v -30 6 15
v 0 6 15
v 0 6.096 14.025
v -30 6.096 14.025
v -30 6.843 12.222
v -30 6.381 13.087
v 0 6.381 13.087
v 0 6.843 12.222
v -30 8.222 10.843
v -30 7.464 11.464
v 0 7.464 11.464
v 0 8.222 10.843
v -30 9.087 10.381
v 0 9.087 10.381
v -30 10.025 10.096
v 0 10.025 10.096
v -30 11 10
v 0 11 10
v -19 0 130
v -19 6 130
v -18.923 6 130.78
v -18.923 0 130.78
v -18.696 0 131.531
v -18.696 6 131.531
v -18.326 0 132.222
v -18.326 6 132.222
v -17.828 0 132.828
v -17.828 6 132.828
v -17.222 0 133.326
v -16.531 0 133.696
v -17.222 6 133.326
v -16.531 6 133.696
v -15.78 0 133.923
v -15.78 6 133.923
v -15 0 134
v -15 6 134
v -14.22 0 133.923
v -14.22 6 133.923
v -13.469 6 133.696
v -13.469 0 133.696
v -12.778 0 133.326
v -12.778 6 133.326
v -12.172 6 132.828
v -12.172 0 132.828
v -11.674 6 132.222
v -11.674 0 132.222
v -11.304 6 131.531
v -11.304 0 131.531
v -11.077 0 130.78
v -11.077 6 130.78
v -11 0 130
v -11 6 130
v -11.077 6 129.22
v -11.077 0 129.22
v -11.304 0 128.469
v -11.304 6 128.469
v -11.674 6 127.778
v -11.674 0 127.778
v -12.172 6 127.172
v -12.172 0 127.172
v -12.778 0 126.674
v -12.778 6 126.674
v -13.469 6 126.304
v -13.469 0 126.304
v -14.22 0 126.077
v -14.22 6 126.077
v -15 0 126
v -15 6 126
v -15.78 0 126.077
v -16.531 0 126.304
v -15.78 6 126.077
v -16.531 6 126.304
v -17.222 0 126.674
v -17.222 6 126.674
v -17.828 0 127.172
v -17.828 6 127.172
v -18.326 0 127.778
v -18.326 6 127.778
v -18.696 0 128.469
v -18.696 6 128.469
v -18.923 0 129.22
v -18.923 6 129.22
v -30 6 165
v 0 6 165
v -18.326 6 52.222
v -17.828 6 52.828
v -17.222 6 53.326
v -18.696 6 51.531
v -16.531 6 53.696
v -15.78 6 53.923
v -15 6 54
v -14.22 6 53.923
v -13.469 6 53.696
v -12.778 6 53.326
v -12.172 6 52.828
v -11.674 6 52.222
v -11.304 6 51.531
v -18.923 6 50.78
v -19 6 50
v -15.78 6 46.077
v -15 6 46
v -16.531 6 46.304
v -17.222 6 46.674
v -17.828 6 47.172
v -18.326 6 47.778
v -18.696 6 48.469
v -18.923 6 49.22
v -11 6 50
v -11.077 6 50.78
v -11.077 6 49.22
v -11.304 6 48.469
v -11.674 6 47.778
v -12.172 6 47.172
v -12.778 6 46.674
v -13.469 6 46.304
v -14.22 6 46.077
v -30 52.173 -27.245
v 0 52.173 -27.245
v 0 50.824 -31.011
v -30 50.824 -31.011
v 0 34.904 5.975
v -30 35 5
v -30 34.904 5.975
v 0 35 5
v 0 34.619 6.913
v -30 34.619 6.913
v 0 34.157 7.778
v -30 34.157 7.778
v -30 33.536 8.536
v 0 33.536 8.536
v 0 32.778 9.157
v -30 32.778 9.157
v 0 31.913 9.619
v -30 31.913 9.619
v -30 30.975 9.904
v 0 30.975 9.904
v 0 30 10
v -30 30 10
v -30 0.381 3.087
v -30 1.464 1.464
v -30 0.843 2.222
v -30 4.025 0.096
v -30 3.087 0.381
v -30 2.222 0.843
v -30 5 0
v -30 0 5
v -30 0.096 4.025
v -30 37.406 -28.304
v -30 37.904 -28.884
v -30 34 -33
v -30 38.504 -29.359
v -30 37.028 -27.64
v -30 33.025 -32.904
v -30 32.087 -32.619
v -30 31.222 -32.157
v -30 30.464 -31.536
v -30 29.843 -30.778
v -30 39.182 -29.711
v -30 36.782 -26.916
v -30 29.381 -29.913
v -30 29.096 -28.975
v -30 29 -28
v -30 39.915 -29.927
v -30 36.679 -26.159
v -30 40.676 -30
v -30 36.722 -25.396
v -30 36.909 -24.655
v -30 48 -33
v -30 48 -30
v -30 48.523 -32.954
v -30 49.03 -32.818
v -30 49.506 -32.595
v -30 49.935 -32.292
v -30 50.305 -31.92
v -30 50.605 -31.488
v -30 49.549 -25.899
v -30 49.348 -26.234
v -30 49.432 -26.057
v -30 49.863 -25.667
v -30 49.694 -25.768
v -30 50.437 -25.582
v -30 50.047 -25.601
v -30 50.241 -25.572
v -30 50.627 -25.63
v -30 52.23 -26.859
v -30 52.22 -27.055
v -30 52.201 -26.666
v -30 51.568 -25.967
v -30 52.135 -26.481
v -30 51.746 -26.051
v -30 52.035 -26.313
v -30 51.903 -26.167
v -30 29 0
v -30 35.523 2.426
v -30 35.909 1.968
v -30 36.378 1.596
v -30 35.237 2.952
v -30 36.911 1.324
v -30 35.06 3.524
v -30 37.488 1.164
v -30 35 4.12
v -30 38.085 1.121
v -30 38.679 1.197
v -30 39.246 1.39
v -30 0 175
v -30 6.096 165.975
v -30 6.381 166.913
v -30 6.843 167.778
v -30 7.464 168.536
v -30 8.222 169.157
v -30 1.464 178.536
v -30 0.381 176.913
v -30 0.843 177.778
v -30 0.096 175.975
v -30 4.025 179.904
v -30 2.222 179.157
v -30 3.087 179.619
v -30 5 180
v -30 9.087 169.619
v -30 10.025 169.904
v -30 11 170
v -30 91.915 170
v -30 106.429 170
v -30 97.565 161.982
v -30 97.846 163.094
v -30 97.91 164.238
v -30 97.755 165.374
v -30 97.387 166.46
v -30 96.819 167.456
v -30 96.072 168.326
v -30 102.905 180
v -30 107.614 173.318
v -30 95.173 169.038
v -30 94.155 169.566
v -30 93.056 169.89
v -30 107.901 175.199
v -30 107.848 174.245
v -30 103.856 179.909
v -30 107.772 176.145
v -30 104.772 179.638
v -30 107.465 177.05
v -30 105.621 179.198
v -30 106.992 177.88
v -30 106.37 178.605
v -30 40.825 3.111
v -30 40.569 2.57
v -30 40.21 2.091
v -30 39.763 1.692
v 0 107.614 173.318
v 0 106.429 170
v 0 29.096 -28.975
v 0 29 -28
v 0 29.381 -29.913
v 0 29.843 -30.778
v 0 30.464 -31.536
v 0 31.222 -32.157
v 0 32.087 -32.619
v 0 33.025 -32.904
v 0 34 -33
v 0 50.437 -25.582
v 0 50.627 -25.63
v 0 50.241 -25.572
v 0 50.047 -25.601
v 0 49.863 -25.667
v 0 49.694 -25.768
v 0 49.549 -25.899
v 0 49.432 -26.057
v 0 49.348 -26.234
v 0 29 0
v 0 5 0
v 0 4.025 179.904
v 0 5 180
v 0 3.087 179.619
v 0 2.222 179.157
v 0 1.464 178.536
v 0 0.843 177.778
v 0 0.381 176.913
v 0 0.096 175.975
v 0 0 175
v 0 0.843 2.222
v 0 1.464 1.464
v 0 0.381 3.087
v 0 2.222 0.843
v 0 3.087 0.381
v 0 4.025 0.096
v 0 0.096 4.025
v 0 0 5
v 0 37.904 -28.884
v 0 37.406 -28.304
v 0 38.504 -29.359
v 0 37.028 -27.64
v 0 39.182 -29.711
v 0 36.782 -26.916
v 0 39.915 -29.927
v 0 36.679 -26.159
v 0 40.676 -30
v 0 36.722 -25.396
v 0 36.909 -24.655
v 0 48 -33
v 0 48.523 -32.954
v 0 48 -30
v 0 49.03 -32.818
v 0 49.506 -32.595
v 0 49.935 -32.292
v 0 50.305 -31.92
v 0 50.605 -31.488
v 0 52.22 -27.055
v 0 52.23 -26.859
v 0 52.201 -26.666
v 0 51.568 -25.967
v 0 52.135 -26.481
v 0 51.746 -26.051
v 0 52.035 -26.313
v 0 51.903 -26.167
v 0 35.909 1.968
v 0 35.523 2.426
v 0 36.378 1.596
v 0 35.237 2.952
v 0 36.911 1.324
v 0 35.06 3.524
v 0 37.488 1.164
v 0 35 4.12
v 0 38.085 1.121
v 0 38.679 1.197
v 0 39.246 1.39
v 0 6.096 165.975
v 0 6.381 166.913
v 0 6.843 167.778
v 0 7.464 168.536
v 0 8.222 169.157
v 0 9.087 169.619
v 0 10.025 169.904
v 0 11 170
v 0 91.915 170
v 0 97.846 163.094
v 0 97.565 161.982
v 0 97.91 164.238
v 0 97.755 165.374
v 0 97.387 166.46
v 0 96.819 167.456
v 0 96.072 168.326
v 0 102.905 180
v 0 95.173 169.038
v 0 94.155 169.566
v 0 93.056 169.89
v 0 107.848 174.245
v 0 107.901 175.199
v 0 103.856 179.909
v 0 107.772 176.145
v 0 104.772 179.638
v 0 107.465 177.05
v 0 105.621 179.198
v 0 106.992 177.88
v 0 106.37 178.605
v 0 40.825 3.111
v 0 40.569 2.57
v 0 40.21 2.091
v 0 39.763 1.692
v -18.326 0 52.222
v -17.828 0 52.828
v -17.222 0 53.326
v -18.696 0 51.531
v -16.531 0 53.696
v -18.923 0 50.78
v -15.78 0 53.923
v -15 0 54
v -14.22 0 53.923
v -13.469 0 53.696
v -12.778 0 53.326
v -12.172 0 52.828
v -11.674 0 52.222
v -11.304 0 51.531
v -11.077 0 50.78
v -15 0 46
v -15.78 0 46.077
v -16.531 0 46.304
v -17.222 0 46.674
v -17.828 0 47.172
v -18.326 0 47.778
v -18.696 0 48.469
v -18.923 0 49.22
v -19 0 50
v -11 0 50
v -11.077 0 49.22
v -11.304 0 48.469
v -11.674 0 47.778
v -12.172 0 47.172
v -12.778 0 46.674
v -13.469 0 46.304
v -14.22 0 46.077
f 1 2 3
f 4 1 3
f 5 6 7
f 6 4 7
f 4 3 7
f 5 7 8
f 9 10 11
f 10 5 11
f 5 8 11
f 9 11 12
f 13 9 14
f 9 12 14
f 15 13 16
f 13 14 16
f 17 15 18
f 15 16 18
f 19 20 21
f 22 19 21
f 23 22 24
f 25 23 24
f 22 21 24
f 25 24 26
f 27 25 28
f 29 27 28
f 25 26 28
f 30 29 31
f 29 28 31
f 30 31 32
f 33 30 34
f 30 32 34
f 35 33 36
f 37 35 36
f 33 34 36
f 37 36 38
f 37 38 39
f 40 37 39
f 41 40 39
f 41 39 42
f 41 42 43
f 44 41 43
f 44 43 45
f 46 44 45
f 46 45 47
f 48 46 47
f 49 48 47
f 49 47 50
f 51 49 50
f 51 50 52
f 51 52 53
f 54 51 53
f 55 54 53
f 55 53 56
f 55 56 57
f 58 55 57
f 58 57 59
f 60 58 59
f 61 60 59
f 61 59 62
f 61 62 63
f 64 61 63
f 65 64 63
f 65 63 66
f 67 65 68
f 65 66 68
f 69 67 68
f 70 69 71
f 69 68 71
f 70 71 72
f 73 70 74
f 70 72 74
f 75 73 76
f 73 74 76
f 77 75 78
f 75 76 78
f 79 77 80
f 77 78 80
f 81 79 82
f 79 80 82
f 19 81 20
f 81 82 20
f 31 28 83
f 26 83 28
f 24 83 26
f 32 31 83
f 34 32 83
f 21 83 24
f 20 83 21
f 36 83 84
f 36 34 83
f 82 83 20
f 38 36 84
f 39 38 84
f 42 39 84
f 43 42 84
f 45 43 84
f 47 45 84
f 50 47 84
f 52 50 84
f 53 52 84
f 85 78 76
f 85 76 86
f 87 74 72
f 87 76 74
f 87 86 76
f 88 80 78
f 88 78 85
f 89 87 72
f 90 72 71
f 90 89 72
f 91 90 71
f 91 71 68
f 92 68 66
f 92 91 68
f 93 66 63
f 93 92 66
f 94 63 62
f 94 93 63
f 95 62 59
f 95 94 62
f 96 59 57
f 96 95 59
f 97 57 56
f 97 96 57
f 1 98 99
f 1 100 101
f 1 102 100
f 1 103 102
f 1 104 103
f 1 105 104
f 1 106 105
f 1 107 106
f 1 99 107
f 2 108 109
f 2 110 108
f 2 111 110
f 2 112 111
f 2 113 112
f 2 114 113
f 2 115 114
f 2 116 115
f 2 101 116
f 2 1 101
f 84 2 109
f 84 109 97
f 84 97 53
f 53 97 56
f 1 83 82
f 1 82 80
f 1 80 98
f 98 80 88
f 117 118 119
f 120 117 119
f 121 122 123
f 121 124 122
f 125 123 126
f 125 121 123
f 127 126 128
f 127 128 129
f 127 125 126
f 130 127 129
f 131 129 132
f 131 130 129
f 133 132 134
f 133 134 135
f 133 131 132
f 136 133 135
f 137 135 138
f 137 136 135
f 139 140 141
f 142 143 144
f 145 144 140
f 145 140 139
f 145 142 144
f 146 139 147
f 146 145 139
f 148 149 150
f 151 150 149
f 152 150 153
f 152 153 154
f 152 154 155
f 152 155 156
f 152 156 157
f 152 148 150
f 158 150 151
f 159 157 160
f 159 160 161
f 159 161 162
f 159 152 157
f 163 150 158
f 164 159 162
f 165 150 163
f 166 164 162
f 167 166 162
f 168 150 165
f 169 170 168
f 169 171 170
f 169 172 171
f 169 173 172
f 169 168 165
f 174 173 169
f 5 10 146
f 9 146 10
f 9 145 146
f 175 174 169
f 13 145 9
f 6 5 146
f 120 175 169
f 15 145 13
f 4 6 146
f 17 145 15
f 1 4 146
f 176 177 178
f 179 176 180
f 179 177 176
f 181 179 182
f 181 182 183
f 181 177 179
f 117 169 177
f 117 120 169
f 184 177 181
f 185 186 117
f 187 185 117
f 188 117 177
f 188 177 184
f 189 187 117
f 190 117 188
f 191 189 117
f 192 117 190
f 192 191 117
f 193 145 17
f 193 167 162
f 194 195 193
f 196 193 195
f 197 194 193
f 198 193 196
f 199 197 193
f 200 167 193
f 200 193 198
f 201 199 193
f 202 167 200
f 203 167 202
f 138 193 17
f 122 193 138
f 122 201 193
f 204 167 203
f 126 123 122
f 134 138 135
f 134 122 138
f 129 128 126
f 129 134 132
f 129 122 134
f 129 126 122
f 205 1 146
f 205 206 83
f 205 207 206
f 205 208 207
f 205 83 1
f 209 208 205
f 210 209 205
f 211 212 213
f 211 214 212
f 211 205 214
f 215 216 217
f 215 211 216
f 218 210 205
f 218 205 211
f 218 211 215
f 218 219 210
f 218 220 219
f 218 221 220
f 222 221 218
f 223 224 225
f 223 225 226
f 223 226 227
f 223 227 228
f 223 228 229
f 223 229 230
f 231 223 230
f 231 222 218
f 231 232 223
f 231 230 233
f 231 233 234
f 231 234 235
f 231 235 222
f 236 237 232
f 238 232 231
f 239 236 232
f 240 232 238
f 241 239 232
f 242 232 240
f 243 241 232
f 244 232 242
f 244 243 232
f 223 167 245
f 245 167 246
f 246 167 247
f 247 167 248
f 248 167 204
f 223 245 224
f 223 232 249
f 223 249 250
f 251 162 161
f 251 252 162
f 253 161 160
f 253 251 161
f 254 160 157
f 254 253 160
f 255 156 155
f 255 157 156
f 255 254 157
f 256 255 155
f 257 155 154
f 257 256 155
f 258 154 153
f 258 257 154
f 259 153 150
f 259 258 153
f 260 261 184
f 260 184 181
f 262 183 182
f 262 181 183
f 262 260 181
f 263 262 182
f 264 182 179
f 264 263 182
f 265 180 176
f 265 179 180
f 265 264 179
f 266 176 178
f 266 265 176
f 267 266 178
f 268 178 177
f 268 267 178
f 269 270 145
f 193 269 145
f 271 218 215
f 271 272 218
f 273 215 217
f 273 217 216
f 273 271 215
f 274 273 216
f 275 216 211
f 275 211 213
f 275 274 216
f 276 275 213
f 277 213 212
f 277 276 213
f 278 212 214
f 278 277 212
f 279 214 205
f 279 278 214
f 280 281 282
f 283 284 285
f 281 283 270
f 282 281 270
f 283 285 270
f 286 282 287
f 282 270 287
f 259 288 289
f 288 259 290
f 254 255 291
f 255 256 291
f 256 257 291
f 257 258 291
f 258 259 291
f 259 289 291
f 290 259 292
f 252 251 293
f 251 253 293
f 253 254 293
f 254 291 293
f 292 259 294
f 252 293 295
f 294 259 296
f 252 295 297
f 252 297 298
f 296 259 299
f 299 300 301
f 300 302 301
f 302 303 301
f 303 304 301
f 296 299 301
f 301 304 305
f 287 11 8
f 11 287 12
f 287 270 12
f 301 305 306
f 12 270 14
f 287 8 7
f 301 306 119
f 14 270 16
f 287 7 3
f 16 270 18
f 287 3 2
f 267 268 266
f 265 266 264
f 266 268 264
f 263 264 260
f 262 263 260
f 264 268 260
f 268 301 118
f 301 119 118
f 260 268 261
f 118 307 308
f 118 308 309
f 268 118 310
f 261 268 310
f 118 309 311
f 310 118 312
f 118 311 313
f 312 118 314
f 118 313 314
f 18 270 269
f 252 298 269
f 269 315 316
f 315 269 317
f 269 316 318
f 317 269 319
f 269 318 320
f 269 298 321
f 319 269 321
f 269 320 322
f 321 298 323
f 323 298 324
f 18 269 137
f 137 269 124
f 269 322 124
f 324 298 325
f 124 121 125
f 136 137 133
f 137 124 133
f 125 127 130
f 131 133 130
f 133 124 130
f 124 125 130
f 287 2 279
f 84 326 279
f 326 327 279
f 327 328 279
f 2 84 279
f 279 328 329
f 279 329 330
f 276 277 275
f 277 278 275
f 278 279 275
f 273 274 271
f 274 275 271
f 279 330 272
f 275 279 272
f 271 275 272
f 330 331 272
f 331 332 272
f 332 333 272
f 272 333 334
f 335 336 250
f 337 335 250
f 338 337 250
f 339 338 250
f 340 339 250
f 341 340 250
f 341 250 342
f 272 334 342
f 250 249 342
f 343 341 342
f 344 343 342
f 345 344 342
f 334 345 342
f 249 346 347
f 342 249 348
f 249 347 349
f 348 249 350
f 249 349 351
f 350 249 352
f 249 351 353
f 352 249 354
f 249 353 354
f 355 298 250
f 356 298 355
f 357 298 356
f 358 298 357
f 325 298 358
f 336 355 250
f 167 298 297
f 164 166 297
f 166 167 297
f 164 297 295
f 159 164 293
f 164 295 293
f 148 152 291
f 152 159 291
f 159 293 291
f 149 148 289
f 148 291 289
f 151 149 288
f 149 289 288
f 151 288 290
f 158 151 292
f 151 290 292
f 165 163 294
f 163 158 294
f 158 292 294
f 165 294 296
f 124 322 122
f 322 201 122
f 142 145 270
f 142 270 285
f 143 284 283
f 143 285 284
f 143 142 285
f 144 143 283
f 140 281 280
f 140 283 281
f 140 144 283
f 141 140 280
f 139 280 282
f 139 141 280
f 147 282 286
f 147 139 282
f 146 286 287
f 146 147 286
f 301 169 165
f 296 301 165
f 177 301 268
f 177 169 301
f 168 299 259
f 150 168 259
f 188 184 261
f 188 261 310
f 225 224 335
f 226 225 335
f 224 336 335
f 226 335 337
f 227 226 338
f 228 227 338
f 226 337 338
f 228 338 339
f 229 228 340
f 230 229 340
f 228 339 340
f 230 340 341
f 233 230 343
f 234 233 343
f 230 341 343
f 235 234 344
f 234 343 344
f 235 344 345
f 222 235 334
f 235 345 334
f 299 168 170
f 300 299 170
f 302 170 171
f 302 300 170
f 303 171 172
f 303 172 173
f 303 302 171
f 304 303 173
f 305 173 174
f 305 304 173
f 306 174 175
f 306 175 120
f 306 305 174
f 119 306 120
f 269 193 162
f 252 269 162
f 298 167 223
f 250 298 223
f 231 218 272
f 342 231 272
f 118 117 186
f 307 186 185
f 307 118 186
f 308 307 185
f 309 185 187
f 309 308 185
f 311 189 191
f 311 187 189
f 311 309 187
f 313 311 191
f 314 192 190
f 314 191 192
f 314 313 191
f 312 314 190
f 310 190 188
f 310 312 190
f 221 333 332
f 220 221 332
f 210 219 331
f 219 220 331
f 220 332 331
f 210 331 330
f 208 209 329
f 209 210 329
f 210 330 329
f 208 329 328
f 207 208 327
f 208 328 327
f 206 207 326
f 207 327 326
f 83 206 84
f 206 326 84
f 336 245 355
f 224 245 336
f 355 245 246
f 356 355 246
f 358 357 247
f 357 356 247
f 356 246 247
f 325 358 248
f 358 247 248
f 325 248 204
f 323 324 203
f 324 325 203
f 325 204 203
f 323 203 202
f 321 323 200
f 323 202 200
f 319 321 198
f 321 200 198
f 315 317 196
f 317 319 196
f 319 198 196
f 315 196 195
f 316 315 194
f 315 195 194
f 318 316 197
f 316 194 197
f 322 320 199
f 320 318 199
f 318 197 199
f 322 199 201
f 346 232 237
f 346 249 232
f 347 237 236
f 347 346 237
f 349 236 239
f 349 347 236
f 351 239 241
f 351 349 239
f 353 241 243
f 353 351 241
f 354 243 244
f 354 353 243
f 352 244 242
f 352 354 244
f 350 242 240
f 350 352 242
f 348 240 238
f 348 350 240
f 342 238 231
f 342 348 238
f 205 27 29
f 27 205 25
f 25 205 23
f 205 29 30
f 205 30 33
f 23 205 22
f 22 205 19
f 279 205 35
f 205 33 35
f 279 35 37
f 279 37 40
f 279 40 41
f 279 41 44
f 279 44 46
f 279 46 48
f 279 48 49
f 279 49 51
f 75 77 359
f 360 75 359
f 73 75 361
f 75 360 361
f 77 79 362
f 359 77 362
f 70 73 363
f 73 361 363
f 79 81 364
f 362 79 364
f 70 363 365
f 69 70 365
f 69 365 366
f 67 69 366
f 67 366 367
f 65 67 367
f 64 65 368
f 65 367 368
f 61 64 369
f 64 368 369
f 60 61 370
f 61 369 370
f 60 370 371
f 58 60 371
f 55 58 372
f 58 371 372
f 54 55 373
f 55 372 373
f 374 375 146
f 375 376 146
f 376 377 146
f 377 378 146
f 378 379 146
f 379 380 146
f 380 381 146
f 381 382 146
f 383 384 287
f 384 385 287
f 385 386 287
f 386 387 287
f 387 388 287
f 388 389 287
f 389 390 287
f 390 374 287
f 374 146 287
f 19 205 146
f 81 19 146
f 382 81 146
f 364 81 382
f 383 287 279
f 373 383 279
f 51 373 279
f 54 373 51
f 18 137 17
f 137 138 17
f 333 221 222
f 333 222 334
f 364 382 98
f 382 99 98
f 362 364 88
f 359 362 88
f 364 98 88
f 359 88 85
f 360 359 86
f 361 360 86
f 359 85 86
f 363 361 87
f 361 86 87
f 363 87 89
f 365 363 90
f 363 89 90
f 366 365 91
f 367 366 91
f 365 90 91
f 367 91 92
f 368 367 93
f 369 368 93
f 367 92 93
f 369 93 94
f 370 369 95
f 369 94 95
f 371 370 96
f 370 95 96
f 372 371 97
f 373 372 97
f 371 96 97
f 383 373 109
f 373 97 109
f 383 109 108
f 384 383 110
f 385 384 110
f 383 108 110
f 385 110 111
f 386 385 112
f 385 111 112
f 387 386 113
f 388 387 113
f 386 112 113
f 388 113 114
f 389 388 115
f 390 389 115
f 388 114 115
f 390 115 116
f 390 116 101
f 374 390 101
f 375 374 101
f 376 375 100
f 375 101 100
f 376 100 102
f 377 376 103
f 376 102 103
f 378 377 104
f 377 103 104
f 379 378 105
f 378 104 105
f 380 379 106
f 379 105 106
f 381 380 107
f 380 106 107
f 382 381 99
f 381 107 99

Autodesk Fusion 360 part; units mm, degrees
sketch "Sketch5" plane through (0, 0, 0) normal (0, 1, 0) x (1, 0, 0)
  line L0 (0, 0) -> (-30, 0)
  line L1 (-30, 0) -> (-30, -180)
  line L2 (-30, -180) -> (0, -180)
  line L3 (0, -180) -> (0, 0)
  dimension "d12" = 30
  dimension "d13" = 180
extrude "Extrude4" add sketch "Sketch5" along normal blind 4
sketch "Sketch6" plane through (0, 4, 0) normal (0, 1, 0) x (-1, 0, 0)
  line L0 (0, 180) -> (0, 0)
  line L1 (0, 0) -> (30, 0)
  line L2 (30, 0) -> (30, 180)
  line L3 (30, 180) -> (0, 180)
  line L4 (0, 180) -> (30, 180)
  line L5 (30, 180) -> (30, 170)
  line L6 (30, 170) -> (0, 170)
  line L7 (0, 170) -> (0, 180)
  dimension "d16" = 10
extrude "Extrude5" add sketch "Sketch6" along normal blind 106 contours L0 L2 L3 L4 L5 L6 L7
sketch "Sketch7" plane through (0, 4, 0) normal (0, 1, 0) x (-1, 0, 0)
  line L0 (30, 170) -> (0, 170)
  line L1 (0, 170) -> (0, 0)
  line L2 (0, 0) -> (30, 0)
  line L3 (30, 0) -> (30, 170)
  line L4 (0, 0) -> (30, 0)
  line L5 (30, 0) -> (30, 10)
  line L6 (30, 10) -> (0, 10)
  line L7 (0, 10) -> (0, 0)
  dimension "d19" = 10
extrude "Extrude6" add sketch "Sketch7" along normal blind 25 contours L1 L2 L3 L4 L5 L6 L7
sketch "Sketch8" plane through (-30, 0, 0) normal (-1, 0, 0) x (0, 0, 1)
  line L0 (0, 0) -> (180, 0)
  line L1 (180, 0) -> (180, 110)
  line L2 (180, 110) -> (170, 110)
  line L3 (170, 110) -> (170, 4)
  line L4 (170, 4) -> (10, 4)
  line L5 (10, 4) -> (10, 29)
  line L6 (10, 29) -> (0, 29)
  line L7 (0, 29) -> (0, 0)
  line L8 (10, 29) -> (-30, 29)
  line L9 (-30, 29) -> (-30, 35)
  line L10 (-30, 35) -> (10, 35)
  line L11 (10, 35) -> (10, 29)
  dimension "d22" = 40
  dimension "d23" = 6
extrude "Extrude7" add sketch "Sketch8" against normal blind 30 contours L6 L8 L9 L10 L11
sketch "Sketch9" plane through (-30, 0, 0) normal (-1, 0, 0) x (0, 0, 1)
  line L0 (0, 0) -> (180, 0)
  line L1 (180, 0) -> (180, 110)
  line L2 (180, 110) -> (170, 110)
  line L3 (170, 110) -> (170, 4)
  line L4 (170, 4) -> (10, 4)
  line L5 (10, 4) -> (10, 35)
  line L6 (10, 35) -> (-30, 35)
  line L7 (-30, 35) -> (-30, 29)
  line L8 (-30, 29) -> (0, 29)
  line L9 (0, 29) -> (0, 0)
  line L10 (-30, 35) -> (180, 110)
  line L11 (-30, 29) -> (180, 104)
  line L12 (180, 104) -> (180, 110)
  line L13 (-30, 35) -> (-30, 29)
extrude "Extrude8" add sketch "Sketch9" against normal blind 30 contours L3 L6 L10 L11
sketch "Sketch10" plane through (-30, 0, 0) normal (-1, 0, 0) x (0, 0, 1)
  line L0 (170, 100.4286) -> (170, 4)
  line L1 (170, 4) -> (10, 4)
  line L2 (10, 4) -> (10, 35)
  line L3 (10, 35) -> (-13.2, 35)
  line L4 (-13.2, 35) -> (170, 100.4286)
  line L5 (170, 106.4286) -> (-30, 35)
  line L6 (-30, 35) -> (-30, 29)
  line L7 (-30, 29) -> (0, 29)
  line L8 (0, 29) -> (0, 0)
  line L9 (0, 0) -> (180, 0)
  line L10 (180, 0) -> (180, 110)
  line L11 (180, 110) -> (170, 110)
  line L12 (170, 110) -> (170, 106.4286)
  line L13 (180, 110) -> (170, 106.4286)
  line L14 (170, 110) -> (180, 110)
extrude "Extrude9" cut sketch "Sketch10" against normal blind 30 contours L11 L12 L13 L14
extrude "Extrude10" add 1 faces at (-20, 4, 63.3333) along direction (0, 1, 0) blind 2
sketch "Sketch11" plane through (-30, 0, 0) normal (-1, 0, 0) x (0, 0, 1)
  line L0 (180, 110) -> (-30, 35)
  line L1 (-30, 35) -> (-30, 29)
  line L2 (-30, 29) -> (0, 29)
  line L3 (0, 29) -> (0, 0)
  line L4 (0, 0) -> (180, 0)
  line L5 (180, 0) -> (180, 110)
  line L6 (170, 6) -> (10, 6)
  line L7 (10, 6) -> (10, 35)
  line L8 (10, 35) -> (-13.2, 35)
  line L9 (-13.2, 35) -> (170, 100.4286)
  line L10 (170, 100.4286) -> (170, 6)
  line L11 (-30, 29) -> (-33, 29)
  line L12 (-33, 29) -> (-33, 48)
  line L13 (-33, 48) -> (-30, 48)
  line L14 (-30, 48) -> (-30, 29)
  dimension "d32" = 3
  dimension "d33" = 19
extrude "Extrude11" add sketch "Sketch11" against normal blind 30 contours L1 L11 L12 L13 L14
sketch "Sketch12" plane through (-30, 0, 0) normal (-1, 0, 0) x (0, 0, 1)
  line L0 (180, 110) -> (-30, 35)
  line L1 (-30, 35) -> (-30, 48)
  line L2 (-30, 48) -> (-33, 48)
  line L3 (-33, 48) -> (-33, 29)
  line L4 (-33, 29) -> (0, 29)
  line L5 (0, 29) -> (0, 0)
  line L6 (0, 0) -> (180, 0)
  line L7 (180, 0) -> (180, 110)
  line L8 (170, 6) -> (10, 6)
  line L9 (10, 6) -> (10, 35)
  line L10 (10, 35) -> (-13.2, 35)
  line L11 (-13.2, 35) -> (170, 100.4286)
  line L12 (170, 100.4286) -> (170, 6)
  line L13 (-30, 48) -> (-25.2926, 49.6855)
  line L14 (-30, 48) -> (-25, 48) construction
  line L15 (-25.2926, 49.6855) -> (-26.3039, 52.5099)
  line L16 (-26.3039, 52.5099) -> (-33, 50.1123)
  line L17 (-33, 50.1123) -> (-33, 48)
  dimension "d38" = 5
  dimension "d39" = 19.7
  dimension "d40" = 3
extrude "Extrude12" add sketch "Sketch12" against normal blind 30 contours L2 L13 L15 L16 L17
fillet "Fillet1" radius 5 1 edges at (-15, 29, -33)
fillet "Fillet2" radius 3 1 edges at (-15, 50.1123, -33)
fillet "Fillet3" radius 4 1 edges at (-15, 35, -30)
fillet "Fillet4" radius 1 2 edges at (-15, 52.5099, -26.3039) (-15, 49.6855, -25.2926)
fillet "Fillet5" radius 2 1 edges at (-15, 35, -13.2)
fillet "Fillet6" radius 5 1 edges at (-15, 110, 180)
fillet "Fillet7" radius 5 2 edges at (-15, 0, 0) (-15, 0, 180)
fillet "Fillet8" radius 5 4 edges at (-15, 35, 10) (-15, 6, 10) (-15, 100.4286, 170) (-15, 6, 170)
sketch "Sketch13" plane through (0, 6, 0) normal (0, 1, 0) x (-1, 0, 0)
  line L0 (30, 165) -> (0, 165)
  line L1 (0, 165) -> (0, 15)
  line L2 (0, 15) -> (30, 15)
  line L3 (30, 15) -> (30, 165)
  circle A0 centre (15, 50) radius 4
  circle A1 centre (15, 130) radius 4
  dimension "d59" = 8
  dimension "d61" = 8
  dimension "d62" = 80
  dimension "d63" = 35
extrude "Extrude13" cut sketch "Sketch13" against normal blind 6 contours A0 | A1
delete_face "DeleteFace1" 1 faces at (-20, 36.0576, -3.4176)
fillet "Fillet9" radius 3 1 edges at (-15, 35, -13.2)
delete_face "DeleteFace2" 1 faces at (-20, 98.2371, 165.9775)
fillet "Fillet10" radius 6 1 edges at (-15, 100.4286, 170)
